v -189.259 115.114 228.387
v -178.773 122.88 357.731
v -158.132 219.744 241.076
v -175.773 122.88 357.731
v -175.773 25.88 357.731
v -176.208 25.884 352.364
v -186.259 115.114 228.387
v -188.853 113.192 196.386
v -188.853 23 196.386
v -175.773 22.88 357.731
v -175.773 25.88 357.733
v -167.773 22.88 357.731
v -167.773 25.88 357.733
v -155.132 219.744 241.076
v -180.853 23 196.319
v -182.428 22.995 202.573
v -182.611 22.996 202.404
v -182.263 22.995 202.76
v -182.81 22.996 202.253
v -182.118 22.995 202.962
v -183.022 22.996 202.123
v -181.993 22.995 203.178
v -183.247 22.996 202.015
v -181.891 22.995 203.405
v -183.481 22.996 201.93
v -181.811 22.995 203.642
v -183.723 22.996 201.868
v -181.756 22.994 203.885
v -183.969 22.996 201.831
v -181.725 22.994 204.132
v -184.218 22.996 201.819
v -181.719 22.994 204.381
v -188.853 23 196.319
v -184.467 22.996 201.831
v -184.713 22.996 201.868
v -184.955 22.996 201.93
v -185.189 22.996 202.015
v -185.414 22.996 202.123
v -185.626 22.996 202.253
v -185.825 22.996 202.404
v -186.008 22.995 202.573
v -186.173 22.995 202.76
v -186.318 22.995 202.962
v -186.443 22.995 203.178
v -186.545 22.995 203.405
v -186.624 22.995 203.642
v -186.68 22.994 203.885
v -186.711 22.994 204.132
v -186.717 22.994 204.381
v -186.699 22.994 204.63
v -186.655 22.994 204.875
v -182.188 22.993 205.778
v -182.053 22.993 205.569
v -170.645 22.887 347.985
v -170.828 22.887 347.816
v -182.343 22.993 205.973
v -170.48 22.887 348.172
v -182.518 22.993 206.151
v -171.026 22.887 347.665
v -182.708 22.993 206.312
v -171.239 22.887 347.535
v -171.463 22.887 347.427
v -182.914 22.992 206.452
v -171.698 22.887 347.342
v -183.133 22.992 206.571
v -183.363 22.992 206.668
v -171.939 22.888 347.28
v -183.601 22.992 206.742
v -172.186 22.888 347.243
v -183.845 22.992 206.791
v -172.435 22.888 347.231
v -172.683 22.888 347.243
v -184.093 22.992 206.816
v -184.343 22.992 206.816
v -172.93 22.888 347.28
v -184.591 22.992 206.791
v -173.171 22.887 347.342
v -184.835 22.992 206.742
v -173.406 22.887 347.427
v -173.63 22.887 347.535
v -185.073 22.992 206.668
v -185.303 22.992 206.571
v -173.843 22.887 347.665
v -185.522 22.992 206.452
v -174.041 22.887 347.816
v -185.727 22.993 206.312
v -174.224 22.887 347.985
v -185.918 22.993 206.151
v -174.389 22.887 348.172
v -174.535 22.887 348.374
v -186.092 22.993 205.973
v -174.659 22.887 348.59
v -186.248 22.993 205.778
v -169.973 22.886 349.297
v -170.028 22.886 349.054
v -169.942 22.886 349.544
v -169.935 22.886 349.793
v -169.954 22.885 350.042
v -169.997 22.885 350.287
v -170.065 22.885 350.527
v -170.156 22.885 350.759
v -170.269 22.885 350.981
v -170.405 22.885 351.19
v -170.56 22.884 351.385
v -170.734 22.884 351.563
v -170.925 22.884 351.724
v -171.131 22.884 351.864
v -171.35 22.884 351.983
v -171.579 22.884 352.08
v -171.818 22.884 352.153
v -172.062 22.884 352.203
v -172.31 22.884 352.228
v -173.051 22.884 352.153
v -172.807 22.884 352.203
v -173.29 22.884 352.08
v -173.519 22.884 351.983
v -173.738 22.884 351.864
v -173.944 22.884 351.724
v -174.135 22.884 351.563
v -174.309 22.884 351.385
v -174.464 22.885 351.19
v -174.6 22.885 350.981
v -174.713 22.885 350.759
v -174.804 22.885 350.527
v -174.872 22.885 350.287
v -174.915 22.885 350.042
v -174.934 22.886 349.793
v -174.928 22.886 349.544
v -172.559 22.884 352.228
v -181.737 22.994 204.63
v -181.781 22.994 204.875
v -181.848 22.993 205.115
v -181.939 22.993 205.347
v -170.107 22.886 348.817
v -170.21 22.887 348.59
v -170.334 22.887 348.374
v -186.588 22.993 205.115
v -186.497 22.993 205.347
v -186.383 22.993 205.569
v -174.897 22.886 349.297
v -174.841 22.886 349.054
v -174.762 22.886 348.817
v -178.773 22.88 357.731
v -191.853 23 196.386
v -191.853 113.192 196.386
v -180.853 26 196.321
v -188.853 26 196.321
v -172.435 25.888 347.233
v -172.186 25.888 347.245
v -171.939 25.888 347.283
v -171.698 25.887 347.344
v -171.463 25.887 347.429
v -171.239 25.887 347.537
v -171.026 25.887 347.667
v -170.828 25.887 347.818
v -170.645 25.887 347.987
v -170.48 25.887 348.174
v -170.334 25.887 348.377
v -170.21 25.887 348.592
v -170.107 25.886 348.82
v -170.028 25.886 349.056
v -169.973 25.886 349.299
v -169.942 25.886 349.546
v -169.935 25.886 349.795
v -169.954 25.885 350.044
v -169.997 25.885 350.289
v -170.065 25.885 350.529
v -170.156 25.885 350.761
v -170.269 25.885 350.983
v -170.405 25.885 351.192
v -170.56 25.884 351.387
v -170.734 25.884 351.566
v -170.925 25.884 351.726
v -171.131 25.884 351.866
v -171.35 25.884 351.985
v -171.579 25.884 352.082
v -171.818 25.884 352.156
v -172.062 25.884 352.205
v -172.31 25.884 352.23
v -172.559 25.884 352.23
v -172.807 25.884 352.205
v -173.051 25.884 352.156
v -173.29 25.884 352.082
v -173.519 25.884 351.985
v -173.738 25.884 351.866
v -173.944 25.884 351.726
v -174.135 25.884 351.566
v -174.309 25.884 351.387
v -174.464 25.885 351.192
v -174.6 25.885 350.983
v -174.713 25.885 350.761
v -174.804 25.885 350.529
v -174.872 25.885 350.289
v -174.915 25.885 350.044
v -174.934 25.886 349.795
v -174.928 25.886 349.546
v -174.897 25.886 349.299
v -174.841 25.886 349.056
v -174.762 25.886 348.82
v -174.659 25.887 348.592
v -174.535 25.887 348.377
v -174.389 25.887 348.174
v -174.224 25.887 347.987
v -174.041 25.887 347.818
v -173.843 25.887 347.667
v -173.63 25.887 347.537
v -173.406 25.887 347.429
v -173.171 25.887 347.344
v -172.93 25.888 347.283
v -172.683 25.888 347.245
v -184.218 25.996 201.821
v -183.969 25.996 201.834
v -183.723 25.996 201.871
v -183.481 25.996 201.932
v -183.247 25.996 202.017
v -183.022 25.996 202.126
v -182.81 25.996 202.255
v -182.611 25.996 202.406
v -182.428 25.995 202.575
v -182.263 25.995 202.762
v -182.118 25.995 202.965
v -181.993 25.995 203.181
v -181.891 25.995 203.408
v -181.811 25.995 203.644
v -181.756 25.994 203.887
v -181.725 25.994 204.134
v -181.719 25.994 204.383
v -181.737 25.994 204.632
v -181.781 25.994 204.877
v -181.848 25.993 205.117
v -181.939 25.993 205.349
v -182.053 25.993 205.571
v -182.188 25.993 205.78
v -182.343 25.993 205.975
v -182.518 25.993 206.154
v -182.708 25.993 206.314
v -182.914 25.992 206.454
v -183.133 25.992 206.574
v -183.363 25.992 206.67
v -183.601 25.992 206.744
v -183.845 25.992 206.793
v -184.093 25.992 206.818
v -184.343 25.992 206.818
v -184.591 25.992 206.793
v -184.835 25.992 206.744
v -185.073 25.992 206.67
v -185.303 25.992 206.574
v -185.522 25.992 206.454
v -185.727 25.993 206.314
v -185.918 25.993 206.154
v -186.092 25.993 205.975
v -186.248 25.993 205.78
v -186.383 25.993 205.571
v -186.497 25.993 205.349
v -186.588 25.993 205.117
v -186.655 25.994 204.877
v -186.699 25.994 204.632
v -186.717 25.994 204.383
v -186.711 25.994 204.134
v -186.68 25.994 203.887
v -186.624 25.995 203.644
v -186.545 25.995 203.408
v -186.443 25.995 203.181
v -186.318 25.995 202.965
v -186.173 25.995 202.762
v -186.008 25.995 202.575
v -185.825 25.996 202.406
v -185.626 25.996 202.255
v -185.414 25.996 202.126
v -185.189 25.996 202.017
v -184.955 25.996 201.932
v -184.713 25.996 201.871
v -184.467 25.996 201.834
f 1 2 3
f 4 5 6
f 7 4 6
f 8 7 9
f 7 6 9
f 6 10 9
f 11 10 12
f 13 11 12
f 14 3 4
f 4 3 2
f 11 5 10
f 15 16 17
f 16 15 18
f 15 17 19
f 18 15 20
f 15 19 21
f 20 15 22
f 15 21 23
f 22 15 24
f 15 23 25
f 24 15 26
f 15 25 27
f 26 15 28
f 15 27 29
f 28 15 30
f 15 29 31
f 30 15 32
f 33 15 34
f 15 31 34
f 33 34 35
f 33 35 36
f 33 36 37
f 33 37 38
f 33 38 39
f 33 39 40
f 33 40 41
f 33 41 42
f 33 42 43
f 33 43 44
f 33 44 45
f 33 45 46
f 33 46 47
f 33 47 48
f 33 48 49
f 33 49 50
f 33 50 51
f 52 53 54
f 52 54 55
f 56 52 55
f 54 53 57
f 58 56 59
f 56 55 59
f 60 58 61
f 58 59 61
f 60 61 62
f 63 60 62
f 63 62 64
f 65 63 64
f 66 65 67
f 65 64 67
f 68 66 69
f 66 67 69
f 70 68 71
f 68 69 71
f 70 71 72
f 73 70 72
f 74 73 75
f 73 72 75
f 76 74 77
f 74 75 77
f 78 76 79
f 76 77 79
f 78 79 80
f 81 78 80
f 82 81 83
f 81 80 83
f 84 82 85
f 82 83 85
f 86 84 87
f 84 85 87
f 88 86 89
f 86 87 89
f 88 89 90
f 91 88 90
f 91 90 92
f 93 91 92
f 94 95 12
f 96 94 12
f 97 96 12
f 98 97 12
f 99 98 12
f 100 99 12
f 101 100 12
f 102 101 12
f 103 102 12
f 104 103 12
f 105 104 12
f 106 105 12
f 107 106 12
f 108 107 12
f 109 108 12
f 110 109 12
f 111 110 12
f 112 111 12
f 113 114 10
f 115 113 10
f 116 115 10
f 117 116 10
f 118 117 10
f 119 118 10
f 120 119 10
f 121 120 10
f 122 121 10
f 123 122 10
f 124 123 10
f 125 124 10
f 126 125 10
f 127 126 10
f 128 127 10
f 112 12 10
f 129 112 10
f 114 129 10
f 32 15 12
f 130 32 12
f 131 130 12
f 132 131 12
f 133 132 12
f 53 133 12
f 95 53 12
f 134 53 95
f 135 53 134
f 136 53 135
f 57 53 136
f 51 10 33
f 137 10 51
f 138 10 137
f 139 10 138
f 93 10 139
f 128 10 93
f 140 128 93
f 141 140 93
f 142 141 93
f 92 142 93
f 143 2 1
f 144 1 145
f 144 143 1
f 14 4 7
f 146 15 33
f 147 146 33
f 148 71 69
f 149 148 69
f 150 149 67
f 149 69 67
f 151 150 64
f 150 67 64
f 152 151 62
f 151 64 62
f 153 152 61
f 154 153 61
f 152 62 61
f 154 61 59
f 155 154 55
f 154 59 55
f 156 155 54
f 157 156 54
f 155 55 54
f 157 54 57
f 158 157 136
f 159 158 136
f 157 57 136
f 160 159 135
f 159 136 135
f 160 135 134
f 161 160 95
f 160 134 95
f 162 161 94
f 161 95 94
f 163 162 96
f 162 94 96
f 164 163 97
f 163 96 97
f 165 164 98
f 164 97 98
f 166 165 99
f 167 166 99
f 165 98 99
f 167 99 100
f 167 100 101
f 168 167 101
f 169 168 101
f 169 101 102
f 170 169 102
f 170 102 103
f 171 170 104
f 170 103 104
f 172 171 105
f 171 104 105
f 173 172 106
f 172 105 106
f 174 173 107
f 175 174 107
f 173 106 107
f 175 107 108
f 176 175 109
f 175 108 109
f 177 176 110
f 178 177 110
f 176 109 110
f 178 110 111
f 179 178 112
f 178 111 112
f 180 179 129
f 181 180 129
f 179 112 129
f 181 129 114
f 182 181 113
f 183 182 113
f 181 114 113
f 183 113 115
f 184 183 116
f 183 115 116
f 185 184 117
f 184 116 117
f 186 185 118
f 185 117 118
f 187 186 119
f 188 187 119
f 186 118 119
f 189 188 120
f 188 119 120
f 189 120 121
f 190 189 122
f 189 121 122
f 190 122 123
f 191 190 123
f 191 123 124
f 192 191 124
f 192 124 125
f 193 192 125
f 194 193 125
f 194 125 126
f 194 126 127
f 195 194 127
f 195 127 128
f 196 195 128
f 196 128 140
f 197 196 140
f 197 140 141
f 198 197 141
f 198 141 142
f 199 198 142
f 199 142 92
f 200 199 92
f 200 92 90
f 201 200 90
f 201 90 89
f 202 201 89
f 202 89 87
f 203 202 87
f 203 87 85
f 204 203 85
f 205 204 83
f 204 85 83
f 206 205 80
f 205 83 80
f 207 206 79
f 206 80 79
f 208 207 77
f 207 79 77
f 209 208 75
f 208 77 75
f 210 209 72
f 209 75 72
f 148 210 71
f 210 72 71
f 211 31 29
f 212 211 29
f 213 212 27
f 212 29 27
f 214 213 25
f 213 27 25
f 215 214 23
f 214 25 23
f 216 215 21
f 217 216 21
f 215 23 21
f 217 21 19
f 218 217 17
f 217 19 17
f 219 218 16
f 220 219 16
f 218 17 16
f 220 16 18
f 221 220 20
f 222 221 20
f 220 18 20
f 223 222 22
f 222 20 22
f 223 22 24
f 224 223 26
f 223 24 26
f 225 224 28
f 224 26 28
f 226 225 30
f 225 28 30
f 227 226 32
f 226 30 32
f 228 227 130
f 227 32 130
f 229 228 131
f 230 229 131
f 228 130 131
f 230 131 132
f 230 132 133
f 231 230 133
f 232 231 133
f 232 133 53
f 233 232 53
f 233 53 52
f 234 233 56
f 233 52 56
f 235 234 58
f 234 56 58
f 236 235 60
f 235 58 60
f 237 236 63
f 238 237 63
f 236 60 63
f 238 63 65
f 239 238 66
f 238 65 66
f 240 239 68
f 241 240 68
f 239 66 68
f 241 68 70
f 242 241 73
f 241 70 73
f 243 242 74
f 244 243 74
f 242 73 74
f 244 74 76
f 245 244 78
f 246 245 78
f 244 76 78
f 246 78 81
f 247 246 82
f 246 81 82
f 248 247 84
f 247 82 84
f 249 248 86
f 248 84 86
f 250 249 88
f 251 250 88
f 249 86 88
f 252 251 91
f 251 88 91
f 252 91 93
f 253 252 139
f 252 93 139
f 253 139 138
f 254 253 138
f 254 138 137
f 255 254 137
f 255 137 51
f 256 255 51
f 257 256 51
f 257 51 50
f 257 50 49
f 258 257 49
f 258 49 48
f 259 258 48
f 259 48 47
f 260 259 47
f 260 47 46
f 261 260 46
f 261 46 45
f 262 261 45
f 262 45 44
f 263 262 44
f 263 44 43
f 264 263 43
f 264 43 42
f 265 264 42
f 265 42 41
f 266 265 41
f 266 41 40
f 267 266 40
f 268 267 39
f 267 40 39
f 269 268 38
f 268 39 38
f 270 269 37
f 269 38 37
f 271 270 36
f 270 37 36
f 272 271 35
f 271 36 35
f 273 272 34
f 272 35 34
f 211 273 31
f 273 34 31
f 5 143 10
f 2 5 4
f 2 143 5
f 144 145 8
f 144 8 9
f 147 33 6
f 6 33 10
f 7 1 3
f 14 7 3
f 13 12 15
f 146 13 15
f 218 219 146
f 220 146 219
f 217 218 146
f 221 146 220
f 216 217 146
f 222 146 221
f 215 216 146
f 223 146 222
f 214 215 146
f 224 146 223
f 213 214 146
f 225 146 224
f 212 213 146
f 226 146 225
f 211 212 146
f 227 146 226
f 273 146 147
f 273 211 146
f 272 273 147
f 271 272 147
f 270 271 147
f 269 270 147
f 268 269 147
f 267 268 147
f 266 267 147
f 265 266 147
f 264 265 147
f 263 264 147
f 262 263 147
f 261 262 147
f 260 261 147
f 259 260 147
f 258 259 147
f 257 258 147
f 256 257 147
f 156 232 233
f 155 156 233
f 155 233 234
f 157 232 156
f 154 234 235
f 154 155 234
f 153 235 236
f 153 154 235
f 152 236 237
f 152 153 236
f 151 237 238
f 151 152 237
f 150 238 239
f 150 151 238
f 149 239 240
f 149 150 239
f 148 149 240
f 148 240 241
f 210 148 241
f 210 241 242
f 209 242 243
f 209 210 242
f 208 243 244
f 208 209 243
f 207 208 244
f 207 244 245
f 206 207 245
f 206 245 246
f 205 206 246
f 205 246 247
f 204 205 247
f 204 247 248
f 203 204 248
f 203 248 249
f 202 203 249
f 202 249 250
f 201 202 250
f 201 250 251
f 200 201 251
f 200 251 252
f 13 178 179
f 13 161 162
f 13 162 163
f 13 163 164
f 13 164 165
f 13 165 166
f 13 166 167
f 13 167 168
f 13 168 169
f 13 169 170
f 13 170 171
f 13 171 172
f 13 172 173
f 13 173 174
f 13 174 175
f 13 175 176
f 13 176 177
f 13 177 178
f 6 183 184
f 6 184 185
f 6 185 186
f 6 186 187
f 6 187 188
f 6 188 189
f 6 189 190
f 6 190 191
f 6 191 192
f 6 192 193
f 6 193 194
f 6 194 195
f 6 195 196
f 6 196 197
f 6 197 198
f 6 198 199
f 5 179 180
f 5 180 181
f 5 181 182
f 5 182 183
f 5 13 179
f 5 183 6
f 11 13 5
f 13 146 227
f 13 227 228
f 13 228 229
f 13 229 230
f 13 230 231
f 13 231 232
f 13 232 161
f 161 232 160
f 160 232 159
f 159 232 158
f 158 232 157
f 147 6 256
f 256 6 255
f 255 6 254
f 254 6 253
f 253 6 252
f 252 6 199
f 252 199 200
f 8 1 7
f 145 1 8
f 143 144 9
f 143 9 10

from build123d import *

# Parameters (mm, degrees)
BOSS_EXTRUDE1_DEPTH = 3
SKETCH1_R           = 2.5
BOSS_EXTRUDE2_DEPTH = 3
BOSS_EXTRUDE5_DEPTH = 3


with BuildPart() as part:
    # 3DSketch1 → Boss-Extrude1 (new, along a direction that is not the sketch's normal)
    with BuildSketch(Plane(origin=(-191.853103939, 23, 196.386082525), x_dir=(0.06876662353575062, 0.5251074950069344, 0.8482530696525858), z_dir=(0.9967300562972695, 0, -0.08080343355106794))):
        Polygon((0, 0), (137.697420516, 85.103590916), (190.208170017, 0), (47.360694134, -76.756953147), align=None)
    extrude(amount=BOSS_EXTRUDE1_DEPTH, dir=(1, 0, 0))

    # Sketch1 → Boss-Extrude2 (add)
    with BuildSketch(Plane(origin=(0, 23.146370891, 0.017253018), x_dir=(1, 0, 0), z_dir=(0, -0.9999997221987764, -0.000745387395963266))):
        Polygon((-175.773130318, 357.71359297), (-167.773130318, 357.71359297), (-180.853103939, 196.301655796), (-188.853103939, 196.301655796), align=None)
        with Locations(Location((-172.434519968, 349.71359297, 0), (0, 0, 270))):
            Circle(SKETCH1_R, mode=Mode.SUBTRACT)
        with Locations(Location((-184.217937823, 204.301655796, 0), (0, 0, 270))):
            Circle(SKETCH1_R, mode=Mode.SUBTRACT)
    extrude(amount=-BOSS_EXTRUDE2_DEPTH)

    # 3DSketch2 → Boss-Extrude5 (add, along a direction that is not the sketch's normal)
    with BuildSketch(Plane(origin=(-189.258816585, 115.113773206, 228.387249638), x_dir=(0.08065912513094323, 0.05973817293580263, 0.99494997674627), z_dir=(-0.9586958466573331, 0.27780635378188856, 0.06104017857437458))):
        Polygon((0, 0), (21.385713883, 107.795899991), (130, 0), align=None)
    extrude(amount=-BOSS_EXTRUDE5_DEPTH, dir=(-1, 0, 0))


solid = part.part
